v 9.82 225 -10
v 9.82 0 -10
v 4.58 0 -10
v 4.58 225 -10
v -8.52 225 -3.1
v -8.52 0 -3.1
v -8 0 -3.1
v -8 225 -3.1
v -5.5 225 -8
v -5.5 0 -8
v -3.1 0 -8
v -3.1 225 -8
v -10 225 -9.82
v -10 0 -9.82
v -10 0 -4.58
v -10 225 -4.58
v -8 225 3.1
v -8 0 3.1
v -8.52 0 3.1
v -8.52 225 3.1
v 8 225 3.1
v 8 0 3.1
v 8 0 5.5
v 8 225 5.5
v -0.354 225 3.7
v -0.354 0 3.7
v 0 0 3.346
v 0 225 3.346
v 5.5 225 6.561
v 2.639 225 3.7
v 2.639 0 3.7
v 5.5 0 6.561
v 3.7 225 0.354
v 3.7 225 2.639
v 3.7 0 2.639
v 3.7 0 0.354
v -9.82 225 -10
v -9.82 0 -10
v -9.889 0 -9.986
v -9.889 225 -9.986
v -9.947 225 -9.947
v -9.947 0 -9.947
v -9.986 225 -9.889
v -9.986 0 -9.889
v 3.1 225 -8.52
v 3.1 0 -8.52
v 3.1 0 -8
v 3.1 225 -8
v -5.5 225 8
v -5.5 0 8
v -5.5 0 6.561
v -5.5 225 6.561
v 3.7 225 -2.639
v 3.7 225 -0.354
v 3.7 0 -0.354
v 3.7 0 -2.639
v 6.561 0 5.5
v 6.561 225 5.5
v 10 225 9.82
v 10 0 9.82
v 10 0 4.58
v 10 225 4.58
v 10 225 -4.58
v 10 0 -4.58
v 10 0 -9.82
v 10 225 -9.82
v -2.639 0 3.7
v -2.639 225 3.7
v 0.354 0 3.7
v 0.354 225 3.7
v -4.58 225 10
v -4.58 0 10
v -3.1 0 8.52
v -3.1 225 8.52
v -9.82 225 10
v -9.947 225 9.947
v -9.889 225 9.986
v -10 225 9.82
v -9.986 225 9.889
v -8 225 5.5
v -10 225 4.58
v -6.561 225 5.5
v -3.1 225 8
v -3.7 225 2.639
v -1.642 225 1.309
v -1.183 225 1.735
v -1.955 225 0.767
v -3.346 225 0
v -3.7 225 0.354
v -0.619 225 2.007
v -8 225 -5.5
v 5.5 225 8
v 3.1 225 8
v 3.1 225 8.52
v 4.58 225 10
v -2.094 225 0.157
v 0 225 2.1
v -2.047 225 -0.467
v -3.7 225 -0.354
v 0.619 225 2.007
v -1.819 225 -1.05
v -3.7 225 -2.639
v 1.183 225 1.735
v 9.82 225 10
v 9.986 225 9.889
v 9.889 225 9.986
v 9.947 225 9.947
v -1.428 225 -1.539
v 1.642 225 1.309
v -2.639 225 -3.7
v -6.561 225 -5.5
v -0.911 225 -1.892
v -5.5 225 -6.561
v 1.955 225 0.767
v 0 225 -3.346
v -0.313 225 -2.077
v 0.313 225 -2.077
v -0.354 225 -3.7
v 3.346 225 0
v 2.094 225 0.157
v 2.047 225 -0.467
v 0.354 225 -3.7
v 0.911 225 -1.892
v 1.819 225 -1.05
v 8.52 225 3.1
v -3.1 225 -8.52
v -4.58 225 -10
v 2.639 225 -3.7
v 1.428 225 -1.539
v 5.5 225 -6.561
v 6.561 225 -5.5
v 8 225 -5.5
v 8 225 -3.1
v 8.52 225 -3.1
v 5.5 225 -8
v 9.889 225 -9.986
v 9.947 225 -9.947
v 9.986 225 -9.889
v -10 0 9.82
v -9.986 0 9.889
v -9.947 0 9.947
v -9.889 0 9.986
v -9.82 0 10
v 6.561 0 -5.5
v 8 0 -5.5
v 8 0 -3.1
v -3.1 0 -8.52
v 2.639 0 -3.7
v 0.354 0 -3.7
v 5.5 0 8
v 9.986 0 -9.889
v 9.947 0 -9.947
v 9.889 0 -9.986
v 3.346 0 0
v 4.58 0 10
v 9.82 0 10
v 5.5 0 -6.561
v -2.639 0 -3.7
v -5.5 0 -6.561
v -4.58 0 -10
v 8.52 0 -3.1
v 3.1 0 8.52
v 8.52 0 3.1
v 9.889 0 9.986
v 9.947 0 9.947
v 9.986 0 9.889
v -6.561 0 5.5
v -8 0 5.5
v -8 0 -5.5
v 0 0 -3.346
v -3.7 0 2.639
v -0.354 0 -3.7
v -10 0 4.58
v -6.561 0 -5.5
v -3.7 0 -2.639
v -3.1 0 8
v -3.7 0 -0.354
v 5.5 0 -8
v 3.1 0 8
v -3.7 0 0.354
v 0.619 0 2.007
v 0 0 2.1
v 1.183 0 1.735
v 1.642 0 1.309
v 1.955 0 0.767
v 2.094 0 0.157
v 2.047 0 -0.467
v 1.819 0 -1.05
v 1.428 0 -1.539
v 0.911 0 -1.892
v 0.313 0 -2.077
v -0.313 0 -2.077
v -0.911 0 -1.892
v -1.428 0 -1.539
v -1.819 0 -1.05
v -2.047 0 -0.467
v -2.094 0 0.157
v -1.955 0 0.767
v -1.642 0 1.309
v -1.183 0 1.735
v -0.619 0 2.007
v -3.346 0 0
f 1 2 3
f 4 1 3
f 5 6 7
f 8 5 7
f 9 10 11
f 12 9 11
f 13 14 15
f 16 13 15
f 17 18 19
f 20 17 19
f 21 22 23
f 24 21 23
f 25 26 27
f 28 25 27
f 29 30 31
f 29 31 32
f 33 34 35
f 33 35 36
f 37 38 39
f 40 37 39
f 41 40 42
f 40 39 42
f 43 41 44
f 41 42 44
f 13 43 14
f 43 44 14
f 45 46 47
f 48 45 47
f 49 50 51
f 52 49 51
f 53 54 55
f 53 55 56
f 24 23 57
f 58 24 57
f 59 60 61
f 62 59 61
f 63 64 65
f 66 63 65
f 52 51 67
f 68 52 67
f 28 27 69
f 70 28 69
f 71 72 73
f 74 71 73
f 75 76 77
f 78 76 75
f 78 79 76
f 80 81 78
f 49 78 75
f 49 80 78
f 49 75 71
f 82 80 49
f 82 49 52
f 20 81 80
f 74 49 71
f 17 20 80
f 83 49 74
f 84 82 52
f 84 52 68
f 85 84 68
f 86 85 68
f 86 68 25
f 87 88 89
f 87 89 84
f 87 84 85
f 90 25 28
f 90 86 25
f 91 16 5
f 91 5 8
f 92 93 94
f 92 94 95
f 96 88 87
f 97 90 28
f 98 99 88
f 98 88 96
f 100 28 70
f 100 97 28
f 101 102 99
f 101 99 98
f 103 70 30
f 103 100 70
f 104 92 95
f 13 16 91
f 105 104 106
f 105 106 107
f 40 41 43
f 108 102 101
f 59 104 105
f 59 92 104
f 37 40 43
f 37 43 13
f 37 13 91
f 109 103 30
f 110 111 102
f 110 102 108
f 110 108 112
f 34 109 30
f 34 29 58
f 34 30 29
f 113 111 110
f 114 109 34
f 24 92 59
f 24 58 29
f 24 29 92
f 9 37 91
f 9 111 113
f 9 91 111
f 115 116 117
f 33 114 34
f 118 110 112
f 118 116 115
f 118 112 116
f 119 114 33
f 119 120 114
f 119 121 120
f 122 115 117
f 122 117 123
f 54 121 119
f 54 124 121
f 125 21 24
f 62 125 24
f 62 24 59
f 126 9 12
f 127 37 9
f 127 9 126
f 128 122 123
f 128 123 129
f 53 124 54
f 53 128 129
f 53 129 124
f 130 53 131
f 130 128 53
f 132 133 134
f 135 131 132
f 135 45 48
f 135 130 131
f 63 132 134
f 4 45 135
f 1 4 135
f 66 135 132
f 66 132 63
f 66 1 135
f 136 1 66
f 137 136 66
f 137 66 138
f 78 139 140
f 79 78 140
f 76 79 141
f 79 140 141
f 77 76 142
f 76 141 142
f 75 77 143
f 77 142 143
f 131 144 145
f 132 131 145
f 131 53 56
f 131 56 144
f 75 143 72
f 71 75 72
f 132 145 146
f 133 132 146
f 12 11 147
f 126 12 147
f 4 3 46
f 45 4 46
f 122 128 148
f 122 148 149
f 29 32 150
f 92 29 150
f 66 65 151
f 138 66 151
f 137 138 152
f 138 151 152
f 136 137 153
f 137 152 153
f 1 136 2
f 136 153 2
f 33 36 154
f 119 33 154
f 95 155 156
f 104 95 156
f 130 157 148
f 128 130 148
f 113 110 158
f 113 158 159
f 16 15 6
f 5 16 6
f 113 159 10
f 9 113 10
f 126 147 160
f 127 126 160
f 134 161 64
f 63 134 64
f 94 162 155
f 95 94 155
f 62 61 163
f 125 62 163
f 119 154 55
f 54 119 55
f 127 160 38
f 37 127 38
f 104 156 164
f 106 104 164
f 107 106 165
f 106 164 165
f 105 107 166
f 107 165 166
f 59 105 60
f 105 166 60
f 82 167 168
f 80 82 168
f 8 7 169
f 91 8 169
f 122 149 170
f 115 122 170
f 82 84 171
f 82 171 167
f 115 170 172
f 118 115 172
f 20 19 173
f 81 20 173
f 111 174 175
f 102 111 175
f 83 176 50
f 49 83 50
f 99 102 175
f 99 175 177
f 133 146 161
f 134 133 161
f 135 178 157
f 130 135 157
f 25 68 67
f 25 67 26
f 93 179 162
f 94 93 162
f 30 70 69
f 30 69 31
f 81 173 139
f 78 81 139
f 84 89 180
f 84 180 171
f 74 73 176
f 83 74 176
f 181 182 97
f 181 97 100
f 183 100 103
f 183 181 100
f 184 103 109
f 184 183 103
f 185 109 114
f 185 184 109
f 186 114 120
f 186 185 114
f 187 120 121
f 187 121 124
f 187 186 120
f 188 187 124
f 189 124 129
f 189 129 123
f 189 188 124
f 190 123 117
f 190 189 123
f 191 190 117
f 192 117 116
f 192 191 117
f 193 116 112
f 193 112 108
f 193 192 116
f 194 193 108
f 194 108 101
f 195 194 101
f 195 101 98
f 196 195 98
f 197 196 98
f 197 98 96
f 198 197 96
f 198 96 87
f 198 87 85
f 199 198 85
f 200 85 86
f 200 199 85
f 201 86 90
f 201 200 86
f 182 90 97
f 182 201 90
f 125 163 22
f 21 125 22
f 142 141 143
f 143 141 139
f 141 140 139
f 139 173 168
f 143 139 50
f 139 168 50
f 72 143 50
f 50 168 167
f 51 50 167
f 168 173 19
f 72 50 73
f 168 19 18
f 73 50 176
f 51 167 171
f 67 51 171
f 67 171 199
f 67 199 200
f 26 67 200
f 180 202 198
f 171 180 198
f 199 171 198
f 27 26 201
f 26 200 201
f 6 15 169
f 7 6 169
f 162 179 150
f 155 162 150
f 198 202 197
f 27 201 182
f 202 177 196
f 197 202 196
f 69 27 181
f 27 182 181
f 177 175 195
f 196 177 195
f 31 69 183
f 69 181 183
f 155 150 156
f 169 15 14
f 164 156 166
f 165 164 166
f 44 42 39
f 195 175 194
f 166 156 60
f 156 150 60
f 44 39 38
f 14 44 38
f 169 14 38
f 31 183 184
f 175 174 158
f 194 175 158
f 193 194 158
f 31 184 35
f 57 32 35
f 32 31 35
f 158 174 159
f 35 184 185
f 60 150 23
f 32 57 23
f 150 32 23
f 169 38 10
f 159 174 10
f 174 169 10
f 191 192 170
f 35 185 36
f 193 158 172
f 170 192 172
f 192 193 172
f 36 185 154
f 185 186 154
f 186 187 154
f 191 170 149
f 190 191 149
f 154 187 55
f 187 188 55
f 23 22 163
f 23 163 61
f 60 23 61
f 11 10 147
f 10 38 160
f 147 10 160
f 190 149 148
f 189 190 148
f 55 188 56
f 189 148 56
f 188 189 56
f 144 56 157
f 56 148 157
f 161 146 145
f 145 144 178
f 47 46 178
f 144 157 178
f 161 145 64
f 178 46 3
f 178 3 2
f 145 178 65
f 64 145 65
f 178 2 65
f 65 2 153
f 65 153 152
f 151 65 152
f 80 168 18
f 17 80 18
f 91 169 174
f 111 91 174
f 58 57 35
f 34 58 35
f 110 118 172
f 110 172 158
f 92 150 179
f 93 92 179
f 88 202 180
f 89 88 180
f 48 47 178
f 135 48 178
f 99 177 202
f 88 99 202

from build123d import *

# Parameters (mm, degrees)
ESQUISSE1_R        = 2.1
BOSS_EXTRU_1_DEPTH = 225


with BuildPart() as part:
    # Esquisse1 → Boss.-Extru.1 (new body)
    with BuildSketch(Plane(origin=(0, 0, 0), x_dir=(1, 0, 0), z_dir=(0, 1, 0))):
        with BuildLine():
            Line((3.7, 2.639339828), (6.560660172, 5.5))
            Line((6.560660172, 5.5), (8, 5.5))
            Line((8, 5.5), (8, 3.1))
            Line((8, 3.1), (8.52, 3.1))
            Line((8.52, 3.1), (10, 4.58))
            Line((10, 4.58), (10, 9.82))
            ThreePointArc((10, 9.82), (9.947279221, 9.947279221), (9.82, 10))
            Line((9.82, 10), (4.58, 10))
            Line((4.58, 10), (3.1, 8.52))
            Line((3.1, 8.52), (3.1, 8))
            Line((3.1, 8), (5.5, 8))
            Line((5.5, 8), (5.5, 6.560660172))
            Line((5.5, 6.560660172), (2.639339828, 3.7))
            Line((2.639339828, 3.7), (0.353553391, 3.7))
            Line((0.353553391, 3.7), (0, 3.346446609))
            Line((0, 3.346446609), (-0.353553391, 3.7))
            Line((-0.353553391, 3.7), (-2.639339828, 3.7))
            Line((-2.639339828, 3.7), (-5.5, 6.560660172))
            Line((-5.5, 6.560660172), (-5.5, 8))
            Line((-5.5, 8), (-3.1, 8))
            Line((-3.1, 8), (-3.1, 8.52))
            Line((-3.1, 8.52), (-4.58, 10))
            Line((-4.58, 10), (-9.82, 10))
            ThreePointArc((-9.82, 10), (-9.947279221, 9.947279221), (-10, 9.82))
            Line((-10, 9.82), (-10, 4.58))
            Line((-10, 4.58), (-8.52, 3.1))
            Line((-8.52, 3.1), (-8, 3.1))
            Line((-8, 3.1), (-8, 5.5))
            Line((-8, 5.5), (-6.560660172, 5.5))
            Line((-6.560660172, 5.5), (-3.7, 2.639339828))
            Line((-3.7, 2.639339828), (-3.7, 0.353553391))
            Line((-3.7, 0.353553391), (-3.346446609, 0))
            Line((-3.346446609, 0), (-3.7, -0.353553391))
            Line((-3.7, -0.353553391), (-3.7, -2.639339828))
            Line((-3.7, -2.639339828), (-6.560660172, -5.5))
            Line((-6.560660172, -5.5), (-8, -5.5))
            Line((-8, -5.5), (-8, -3.1))
            Line((-8, -3.1), (-8.52, -3.1))
            Line((-8.52, -3.1), (-10, -4.58))
            Line((-10, -4.58), (-10, -9.82))
            ThreePointArc((-10, -9.82), (-9.947279221, -9.947279221), (-9.82, -10))
            Line((-9.82, -10), (-4.58, -10))
            Line((-4.58, -10), (-3.1, -8.52))
            Line((-3.1, -8.52), (-3.1, -8))
            Line((-3.1, -8), (-5.5, -8))
            Line((-5.5, -8), (-5.5, -6.560660172))
            Line((-5.5, -6.560660172), (-2.639339828, -3.7))
            Line((-2.639339828, -3.7), (-0.353553391, -3.7))
            Line((-0.353553391, -3.7), (0, -3.346446609))
            Line((0, -3.346446609), (0.353553391, -3.7))
            Line((0.353553391, -3.7), (2.639339828, -3.7))
            Line((2.639339828, -3.7), (5.5, -6.560660172))
            Line((5.5, -6.560660172), (5.5, -8))
            Line((5.5, -8), (3.1, -8))
            Line((3.1, -8), (3.1, -8.52))
            Line((3.1, -8.52), (4.58, -10))
            Line((4.58, -10), (9.82, -10))
            ThreePointArc((9.82, -10), (9.947279221, -9.947279221), (10, -9.82))
            Line((10, -9.82), (10, -4.58))
            Line((10, -4.58), (8.52, -3.1))
            Line((8.52, -3.1), (8, -3.1))
            Line((8, -3.1), (8, -5.5))
            Line((8, -5.5), (6.560660172, -5.5))
            Line((6.560660172, -5.5), (3.7, -2.639339828))
            Line((3.7, -2.639339828), (3.7, -0.353553391))
            Line((3.7, -0.353553391), (3.346446609, 0))
            Line((3.346446609, 0), (3.7, 0.353553391))
            Line((3.7, 0.353553391), (3.7, 2.639339828))
        make_face()
        with Locations(Location((0, 0, 0), (0, 0, 270))):
            Circle(ESQUISSE1_R, mode=Mode.SUBTRACT)
    extrude(amount=BOSS_EXTRU_1_DEPTH)


solid = part.part
